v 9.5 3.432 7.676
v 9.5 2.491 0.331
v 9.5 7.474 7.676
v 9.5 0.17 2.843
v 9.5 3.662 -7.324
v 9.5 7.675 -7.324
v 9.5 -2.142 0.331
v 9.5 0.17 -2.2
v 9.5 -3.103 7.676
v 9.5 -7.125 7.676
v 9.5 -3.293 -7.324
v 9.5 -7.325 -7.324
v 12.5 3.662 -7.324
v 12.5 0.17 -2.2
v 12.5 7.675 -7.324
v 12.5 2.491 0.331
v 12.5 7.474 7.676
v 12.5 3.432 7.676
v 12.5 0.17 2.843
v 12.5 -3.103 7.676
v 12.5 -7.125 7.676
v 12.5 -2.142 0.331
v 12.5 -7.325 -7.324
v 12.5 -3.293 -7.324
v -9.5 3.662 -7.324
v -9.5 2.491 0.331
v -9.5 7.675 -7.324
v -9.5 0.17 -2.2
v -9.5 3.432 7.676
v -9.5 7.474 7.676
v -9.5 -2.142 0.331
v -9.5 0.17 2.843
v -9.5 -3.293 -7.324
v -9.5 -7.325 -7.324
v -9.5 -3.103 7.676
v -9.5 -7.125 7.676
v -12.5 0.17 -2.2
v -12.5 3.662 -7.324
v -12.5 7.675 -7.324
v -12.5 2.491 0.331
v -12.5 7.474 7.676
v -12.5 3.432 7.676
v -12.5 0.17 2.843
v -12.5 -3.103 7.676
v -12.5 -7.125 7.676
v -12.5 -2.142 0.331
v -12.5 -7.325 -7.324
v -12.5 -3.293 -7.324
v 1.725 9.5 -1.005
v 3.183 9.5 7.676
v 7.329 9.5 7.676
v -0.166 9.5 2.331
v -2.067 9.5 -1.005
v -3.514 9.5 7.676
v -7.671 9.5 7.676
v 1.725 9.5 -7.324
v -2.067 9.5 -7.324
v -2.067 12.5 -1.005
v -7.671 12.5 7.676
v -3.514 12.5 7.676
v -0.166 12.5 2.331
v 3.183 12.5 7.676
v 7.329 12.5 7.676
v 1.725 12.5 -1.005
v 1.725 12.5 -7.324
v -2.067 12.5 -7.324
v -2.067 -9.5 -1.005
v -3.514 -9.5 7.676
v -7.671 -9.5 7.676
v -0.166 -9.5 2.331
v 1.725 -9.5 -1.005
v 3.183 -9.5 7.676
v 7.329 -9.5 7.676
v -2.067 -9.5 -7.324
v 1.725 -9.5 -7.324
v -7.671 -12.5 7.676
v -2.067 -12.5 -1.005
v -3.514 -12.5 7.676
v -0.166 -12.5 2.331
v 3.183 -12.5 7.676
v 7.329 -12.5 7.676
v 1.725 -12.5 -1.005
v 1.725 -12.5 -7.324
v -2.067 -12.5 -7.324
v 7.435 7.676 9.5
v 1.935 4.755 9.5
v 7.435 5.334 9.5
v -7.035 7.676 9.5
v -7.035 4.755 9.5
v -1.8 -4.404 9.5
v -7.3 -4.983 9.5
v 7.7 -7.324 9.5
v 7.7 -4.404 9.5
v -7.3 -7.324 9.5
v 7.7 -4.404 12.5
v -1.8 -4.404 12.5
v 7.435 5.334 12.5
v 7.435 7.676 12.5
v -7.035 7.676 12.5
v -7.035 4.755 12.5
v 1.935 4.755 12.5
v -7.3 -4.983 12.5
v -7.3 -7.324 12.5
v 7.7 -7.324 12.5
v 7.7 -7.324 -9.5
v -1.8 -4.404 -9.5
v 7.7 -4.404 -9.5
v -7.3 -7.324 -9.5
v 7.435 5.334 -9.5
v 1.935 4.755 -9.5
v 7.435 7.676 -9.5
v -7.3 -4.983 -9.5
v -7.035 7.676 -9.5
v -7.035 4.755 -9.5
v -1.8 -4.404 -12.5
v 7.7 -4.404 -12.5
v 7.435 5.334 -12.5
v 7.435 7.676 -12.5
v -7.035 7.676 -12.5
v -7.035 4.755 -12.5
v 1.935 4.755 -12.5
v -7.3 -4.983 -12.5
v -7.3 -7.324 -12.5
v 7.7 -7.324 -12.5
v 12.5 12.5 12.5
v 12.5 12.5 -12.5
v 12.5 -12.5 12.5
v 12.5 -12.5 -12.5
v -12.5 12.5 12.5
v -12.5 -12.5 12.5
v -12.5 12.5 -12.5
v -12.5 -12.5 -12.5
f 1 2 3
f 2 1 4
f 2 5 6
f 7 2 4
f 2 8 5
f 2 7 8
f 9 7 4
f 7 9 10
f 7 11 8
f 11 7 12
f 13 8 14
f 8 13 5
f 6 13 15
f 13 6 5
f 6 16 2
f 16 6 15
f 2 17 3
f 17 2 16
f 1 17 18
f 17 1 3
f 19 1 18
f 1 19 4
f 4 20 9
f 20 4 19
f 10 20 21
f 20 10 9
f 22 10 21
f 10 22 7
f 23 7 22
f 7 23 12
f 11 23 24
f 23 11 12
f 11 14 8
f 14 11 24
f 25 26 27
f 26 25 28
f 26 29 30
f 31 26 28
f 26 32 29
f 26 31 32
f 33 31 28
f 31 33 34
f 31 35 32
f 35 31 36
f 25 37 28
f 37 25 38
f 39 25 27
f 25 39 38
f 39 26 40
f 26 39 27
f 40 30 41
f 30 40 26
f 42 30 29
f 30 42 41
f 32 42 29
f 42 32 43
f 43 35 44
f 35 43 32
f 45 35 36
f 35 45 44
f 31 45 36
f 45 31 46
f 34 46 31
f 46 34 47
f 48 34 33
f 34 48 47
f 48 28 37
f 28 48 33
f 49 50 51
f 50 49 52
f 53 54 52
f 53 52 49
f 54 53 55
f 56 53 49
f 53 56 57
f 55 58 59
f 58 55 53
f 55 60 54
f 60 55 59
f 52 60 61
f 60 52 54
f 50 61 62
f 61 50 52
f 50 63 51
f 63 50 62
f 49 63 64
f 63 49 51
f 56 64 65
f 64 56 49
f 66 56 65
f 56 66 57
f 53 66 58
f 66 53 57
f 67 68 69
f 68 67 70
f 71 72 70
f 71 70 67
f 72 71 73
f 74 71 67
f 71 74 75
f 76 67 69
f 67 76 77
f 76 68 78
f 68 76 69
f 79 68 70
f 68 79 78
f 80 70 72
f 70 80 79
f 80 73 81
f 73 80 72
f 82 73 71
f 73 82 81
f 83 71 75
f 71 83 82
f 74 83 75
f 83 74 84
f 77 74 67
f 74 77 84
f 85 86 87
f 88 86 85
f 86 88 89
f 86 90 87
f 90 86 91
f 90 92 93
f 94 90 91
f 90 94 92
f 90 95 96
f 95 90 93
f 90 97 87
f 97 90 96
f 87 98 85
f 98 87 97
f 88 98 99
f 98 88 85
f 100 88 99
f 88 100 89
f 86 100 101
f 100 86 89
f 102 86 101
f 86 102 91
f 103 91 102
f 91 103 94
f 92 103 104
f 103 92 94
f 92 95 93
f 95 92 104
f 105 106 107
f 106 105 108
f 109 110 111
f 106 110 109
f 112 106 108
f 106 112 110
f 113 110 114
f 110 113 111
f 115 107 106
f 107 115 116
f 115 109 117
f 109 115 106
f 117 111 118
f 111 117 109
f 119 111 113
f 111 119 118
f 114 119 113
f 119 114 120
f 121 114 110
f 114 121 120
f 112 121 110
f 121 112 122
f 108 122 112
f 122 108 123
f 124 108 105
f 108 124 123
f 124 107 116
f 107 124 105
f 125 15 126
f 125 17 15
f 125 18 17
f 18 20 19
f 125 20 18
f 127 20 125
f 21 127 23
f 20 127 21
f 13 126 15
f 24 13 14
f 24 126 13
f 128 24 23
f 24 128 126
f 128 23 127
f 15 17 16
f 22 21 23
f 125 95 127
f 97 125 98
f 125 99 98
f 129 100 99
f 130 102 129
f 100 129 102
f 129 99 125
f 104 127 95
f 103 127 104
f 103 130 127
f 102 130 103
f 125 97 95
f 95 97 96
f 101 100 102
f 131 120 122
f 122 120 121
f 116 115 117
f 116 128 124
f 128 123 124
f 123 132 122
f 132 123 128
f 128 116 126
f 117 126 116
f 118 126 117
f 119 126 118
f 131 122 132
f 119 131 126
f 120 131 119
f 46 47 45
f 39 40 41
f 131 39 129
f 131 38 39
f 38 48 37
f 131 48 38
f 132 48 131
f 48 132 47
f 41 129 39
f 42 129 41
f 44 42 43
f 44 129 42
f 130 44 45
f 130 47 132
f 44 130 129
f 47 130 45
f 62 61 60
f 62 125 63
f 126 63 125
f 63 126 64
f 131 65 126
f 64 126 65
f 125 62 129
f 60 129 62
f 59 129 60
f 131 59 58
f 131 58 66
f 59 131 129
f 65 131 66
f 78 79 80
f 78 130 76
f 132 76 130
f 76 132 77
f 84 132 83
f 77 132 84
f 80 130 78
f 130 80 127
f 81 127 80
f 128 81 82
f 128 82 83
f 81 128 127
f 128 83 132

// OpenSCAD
module both_faces(destv_1, destv_2, mirv) {
     translate(destv_1) children();
     translate(destv_2) mirror(mirv) children();
}


module face_letter(letter, letter_size, letter_inset, $fn=100) {
     thick = letter_inset + 0.5;

     translate([0, 0, -letter_inset])
     resize([letter_size, letter_size, thick]) {
	  linear_extrude(thick)
	       text(letter, size=10,
		    font="Liberation Sans Mono:style=Bold",
		    valign="center", halign="center");
     };
}


module calib_cube(face_size, letter_ratio=0.6) {

     letter_inset = 3;

     letter_size = face_size * letter_ratio;

     p_offs = (face_size / 2);
     n_offs = (-face_size / 2);

     difference() {
	  cube([face_size, face_size, face_size], center=true);

	  both_faces([p_offs, 0, 0], [n_offs, 0, 0], [1, 0, 0]) {
	       rotate([90, 0, 90])
		    face_letter("X", letter_size, letter_inset);
	  };

	  both_faces([0, p_offs, 0], [0, n_offs, 0], [0, 1, 0]) {
	       rotate([90, 0, 180])
		    face_letter("Y", letter_size, letter_inset);
	  };

          both_faces([0, 0, p_offs], [0, 0, n_offs], [0, 0, 1]) {
	       face_letter("Z", letter_size, letter_inset);
	  };
     };
}


calib_cube(25);


// The end.
